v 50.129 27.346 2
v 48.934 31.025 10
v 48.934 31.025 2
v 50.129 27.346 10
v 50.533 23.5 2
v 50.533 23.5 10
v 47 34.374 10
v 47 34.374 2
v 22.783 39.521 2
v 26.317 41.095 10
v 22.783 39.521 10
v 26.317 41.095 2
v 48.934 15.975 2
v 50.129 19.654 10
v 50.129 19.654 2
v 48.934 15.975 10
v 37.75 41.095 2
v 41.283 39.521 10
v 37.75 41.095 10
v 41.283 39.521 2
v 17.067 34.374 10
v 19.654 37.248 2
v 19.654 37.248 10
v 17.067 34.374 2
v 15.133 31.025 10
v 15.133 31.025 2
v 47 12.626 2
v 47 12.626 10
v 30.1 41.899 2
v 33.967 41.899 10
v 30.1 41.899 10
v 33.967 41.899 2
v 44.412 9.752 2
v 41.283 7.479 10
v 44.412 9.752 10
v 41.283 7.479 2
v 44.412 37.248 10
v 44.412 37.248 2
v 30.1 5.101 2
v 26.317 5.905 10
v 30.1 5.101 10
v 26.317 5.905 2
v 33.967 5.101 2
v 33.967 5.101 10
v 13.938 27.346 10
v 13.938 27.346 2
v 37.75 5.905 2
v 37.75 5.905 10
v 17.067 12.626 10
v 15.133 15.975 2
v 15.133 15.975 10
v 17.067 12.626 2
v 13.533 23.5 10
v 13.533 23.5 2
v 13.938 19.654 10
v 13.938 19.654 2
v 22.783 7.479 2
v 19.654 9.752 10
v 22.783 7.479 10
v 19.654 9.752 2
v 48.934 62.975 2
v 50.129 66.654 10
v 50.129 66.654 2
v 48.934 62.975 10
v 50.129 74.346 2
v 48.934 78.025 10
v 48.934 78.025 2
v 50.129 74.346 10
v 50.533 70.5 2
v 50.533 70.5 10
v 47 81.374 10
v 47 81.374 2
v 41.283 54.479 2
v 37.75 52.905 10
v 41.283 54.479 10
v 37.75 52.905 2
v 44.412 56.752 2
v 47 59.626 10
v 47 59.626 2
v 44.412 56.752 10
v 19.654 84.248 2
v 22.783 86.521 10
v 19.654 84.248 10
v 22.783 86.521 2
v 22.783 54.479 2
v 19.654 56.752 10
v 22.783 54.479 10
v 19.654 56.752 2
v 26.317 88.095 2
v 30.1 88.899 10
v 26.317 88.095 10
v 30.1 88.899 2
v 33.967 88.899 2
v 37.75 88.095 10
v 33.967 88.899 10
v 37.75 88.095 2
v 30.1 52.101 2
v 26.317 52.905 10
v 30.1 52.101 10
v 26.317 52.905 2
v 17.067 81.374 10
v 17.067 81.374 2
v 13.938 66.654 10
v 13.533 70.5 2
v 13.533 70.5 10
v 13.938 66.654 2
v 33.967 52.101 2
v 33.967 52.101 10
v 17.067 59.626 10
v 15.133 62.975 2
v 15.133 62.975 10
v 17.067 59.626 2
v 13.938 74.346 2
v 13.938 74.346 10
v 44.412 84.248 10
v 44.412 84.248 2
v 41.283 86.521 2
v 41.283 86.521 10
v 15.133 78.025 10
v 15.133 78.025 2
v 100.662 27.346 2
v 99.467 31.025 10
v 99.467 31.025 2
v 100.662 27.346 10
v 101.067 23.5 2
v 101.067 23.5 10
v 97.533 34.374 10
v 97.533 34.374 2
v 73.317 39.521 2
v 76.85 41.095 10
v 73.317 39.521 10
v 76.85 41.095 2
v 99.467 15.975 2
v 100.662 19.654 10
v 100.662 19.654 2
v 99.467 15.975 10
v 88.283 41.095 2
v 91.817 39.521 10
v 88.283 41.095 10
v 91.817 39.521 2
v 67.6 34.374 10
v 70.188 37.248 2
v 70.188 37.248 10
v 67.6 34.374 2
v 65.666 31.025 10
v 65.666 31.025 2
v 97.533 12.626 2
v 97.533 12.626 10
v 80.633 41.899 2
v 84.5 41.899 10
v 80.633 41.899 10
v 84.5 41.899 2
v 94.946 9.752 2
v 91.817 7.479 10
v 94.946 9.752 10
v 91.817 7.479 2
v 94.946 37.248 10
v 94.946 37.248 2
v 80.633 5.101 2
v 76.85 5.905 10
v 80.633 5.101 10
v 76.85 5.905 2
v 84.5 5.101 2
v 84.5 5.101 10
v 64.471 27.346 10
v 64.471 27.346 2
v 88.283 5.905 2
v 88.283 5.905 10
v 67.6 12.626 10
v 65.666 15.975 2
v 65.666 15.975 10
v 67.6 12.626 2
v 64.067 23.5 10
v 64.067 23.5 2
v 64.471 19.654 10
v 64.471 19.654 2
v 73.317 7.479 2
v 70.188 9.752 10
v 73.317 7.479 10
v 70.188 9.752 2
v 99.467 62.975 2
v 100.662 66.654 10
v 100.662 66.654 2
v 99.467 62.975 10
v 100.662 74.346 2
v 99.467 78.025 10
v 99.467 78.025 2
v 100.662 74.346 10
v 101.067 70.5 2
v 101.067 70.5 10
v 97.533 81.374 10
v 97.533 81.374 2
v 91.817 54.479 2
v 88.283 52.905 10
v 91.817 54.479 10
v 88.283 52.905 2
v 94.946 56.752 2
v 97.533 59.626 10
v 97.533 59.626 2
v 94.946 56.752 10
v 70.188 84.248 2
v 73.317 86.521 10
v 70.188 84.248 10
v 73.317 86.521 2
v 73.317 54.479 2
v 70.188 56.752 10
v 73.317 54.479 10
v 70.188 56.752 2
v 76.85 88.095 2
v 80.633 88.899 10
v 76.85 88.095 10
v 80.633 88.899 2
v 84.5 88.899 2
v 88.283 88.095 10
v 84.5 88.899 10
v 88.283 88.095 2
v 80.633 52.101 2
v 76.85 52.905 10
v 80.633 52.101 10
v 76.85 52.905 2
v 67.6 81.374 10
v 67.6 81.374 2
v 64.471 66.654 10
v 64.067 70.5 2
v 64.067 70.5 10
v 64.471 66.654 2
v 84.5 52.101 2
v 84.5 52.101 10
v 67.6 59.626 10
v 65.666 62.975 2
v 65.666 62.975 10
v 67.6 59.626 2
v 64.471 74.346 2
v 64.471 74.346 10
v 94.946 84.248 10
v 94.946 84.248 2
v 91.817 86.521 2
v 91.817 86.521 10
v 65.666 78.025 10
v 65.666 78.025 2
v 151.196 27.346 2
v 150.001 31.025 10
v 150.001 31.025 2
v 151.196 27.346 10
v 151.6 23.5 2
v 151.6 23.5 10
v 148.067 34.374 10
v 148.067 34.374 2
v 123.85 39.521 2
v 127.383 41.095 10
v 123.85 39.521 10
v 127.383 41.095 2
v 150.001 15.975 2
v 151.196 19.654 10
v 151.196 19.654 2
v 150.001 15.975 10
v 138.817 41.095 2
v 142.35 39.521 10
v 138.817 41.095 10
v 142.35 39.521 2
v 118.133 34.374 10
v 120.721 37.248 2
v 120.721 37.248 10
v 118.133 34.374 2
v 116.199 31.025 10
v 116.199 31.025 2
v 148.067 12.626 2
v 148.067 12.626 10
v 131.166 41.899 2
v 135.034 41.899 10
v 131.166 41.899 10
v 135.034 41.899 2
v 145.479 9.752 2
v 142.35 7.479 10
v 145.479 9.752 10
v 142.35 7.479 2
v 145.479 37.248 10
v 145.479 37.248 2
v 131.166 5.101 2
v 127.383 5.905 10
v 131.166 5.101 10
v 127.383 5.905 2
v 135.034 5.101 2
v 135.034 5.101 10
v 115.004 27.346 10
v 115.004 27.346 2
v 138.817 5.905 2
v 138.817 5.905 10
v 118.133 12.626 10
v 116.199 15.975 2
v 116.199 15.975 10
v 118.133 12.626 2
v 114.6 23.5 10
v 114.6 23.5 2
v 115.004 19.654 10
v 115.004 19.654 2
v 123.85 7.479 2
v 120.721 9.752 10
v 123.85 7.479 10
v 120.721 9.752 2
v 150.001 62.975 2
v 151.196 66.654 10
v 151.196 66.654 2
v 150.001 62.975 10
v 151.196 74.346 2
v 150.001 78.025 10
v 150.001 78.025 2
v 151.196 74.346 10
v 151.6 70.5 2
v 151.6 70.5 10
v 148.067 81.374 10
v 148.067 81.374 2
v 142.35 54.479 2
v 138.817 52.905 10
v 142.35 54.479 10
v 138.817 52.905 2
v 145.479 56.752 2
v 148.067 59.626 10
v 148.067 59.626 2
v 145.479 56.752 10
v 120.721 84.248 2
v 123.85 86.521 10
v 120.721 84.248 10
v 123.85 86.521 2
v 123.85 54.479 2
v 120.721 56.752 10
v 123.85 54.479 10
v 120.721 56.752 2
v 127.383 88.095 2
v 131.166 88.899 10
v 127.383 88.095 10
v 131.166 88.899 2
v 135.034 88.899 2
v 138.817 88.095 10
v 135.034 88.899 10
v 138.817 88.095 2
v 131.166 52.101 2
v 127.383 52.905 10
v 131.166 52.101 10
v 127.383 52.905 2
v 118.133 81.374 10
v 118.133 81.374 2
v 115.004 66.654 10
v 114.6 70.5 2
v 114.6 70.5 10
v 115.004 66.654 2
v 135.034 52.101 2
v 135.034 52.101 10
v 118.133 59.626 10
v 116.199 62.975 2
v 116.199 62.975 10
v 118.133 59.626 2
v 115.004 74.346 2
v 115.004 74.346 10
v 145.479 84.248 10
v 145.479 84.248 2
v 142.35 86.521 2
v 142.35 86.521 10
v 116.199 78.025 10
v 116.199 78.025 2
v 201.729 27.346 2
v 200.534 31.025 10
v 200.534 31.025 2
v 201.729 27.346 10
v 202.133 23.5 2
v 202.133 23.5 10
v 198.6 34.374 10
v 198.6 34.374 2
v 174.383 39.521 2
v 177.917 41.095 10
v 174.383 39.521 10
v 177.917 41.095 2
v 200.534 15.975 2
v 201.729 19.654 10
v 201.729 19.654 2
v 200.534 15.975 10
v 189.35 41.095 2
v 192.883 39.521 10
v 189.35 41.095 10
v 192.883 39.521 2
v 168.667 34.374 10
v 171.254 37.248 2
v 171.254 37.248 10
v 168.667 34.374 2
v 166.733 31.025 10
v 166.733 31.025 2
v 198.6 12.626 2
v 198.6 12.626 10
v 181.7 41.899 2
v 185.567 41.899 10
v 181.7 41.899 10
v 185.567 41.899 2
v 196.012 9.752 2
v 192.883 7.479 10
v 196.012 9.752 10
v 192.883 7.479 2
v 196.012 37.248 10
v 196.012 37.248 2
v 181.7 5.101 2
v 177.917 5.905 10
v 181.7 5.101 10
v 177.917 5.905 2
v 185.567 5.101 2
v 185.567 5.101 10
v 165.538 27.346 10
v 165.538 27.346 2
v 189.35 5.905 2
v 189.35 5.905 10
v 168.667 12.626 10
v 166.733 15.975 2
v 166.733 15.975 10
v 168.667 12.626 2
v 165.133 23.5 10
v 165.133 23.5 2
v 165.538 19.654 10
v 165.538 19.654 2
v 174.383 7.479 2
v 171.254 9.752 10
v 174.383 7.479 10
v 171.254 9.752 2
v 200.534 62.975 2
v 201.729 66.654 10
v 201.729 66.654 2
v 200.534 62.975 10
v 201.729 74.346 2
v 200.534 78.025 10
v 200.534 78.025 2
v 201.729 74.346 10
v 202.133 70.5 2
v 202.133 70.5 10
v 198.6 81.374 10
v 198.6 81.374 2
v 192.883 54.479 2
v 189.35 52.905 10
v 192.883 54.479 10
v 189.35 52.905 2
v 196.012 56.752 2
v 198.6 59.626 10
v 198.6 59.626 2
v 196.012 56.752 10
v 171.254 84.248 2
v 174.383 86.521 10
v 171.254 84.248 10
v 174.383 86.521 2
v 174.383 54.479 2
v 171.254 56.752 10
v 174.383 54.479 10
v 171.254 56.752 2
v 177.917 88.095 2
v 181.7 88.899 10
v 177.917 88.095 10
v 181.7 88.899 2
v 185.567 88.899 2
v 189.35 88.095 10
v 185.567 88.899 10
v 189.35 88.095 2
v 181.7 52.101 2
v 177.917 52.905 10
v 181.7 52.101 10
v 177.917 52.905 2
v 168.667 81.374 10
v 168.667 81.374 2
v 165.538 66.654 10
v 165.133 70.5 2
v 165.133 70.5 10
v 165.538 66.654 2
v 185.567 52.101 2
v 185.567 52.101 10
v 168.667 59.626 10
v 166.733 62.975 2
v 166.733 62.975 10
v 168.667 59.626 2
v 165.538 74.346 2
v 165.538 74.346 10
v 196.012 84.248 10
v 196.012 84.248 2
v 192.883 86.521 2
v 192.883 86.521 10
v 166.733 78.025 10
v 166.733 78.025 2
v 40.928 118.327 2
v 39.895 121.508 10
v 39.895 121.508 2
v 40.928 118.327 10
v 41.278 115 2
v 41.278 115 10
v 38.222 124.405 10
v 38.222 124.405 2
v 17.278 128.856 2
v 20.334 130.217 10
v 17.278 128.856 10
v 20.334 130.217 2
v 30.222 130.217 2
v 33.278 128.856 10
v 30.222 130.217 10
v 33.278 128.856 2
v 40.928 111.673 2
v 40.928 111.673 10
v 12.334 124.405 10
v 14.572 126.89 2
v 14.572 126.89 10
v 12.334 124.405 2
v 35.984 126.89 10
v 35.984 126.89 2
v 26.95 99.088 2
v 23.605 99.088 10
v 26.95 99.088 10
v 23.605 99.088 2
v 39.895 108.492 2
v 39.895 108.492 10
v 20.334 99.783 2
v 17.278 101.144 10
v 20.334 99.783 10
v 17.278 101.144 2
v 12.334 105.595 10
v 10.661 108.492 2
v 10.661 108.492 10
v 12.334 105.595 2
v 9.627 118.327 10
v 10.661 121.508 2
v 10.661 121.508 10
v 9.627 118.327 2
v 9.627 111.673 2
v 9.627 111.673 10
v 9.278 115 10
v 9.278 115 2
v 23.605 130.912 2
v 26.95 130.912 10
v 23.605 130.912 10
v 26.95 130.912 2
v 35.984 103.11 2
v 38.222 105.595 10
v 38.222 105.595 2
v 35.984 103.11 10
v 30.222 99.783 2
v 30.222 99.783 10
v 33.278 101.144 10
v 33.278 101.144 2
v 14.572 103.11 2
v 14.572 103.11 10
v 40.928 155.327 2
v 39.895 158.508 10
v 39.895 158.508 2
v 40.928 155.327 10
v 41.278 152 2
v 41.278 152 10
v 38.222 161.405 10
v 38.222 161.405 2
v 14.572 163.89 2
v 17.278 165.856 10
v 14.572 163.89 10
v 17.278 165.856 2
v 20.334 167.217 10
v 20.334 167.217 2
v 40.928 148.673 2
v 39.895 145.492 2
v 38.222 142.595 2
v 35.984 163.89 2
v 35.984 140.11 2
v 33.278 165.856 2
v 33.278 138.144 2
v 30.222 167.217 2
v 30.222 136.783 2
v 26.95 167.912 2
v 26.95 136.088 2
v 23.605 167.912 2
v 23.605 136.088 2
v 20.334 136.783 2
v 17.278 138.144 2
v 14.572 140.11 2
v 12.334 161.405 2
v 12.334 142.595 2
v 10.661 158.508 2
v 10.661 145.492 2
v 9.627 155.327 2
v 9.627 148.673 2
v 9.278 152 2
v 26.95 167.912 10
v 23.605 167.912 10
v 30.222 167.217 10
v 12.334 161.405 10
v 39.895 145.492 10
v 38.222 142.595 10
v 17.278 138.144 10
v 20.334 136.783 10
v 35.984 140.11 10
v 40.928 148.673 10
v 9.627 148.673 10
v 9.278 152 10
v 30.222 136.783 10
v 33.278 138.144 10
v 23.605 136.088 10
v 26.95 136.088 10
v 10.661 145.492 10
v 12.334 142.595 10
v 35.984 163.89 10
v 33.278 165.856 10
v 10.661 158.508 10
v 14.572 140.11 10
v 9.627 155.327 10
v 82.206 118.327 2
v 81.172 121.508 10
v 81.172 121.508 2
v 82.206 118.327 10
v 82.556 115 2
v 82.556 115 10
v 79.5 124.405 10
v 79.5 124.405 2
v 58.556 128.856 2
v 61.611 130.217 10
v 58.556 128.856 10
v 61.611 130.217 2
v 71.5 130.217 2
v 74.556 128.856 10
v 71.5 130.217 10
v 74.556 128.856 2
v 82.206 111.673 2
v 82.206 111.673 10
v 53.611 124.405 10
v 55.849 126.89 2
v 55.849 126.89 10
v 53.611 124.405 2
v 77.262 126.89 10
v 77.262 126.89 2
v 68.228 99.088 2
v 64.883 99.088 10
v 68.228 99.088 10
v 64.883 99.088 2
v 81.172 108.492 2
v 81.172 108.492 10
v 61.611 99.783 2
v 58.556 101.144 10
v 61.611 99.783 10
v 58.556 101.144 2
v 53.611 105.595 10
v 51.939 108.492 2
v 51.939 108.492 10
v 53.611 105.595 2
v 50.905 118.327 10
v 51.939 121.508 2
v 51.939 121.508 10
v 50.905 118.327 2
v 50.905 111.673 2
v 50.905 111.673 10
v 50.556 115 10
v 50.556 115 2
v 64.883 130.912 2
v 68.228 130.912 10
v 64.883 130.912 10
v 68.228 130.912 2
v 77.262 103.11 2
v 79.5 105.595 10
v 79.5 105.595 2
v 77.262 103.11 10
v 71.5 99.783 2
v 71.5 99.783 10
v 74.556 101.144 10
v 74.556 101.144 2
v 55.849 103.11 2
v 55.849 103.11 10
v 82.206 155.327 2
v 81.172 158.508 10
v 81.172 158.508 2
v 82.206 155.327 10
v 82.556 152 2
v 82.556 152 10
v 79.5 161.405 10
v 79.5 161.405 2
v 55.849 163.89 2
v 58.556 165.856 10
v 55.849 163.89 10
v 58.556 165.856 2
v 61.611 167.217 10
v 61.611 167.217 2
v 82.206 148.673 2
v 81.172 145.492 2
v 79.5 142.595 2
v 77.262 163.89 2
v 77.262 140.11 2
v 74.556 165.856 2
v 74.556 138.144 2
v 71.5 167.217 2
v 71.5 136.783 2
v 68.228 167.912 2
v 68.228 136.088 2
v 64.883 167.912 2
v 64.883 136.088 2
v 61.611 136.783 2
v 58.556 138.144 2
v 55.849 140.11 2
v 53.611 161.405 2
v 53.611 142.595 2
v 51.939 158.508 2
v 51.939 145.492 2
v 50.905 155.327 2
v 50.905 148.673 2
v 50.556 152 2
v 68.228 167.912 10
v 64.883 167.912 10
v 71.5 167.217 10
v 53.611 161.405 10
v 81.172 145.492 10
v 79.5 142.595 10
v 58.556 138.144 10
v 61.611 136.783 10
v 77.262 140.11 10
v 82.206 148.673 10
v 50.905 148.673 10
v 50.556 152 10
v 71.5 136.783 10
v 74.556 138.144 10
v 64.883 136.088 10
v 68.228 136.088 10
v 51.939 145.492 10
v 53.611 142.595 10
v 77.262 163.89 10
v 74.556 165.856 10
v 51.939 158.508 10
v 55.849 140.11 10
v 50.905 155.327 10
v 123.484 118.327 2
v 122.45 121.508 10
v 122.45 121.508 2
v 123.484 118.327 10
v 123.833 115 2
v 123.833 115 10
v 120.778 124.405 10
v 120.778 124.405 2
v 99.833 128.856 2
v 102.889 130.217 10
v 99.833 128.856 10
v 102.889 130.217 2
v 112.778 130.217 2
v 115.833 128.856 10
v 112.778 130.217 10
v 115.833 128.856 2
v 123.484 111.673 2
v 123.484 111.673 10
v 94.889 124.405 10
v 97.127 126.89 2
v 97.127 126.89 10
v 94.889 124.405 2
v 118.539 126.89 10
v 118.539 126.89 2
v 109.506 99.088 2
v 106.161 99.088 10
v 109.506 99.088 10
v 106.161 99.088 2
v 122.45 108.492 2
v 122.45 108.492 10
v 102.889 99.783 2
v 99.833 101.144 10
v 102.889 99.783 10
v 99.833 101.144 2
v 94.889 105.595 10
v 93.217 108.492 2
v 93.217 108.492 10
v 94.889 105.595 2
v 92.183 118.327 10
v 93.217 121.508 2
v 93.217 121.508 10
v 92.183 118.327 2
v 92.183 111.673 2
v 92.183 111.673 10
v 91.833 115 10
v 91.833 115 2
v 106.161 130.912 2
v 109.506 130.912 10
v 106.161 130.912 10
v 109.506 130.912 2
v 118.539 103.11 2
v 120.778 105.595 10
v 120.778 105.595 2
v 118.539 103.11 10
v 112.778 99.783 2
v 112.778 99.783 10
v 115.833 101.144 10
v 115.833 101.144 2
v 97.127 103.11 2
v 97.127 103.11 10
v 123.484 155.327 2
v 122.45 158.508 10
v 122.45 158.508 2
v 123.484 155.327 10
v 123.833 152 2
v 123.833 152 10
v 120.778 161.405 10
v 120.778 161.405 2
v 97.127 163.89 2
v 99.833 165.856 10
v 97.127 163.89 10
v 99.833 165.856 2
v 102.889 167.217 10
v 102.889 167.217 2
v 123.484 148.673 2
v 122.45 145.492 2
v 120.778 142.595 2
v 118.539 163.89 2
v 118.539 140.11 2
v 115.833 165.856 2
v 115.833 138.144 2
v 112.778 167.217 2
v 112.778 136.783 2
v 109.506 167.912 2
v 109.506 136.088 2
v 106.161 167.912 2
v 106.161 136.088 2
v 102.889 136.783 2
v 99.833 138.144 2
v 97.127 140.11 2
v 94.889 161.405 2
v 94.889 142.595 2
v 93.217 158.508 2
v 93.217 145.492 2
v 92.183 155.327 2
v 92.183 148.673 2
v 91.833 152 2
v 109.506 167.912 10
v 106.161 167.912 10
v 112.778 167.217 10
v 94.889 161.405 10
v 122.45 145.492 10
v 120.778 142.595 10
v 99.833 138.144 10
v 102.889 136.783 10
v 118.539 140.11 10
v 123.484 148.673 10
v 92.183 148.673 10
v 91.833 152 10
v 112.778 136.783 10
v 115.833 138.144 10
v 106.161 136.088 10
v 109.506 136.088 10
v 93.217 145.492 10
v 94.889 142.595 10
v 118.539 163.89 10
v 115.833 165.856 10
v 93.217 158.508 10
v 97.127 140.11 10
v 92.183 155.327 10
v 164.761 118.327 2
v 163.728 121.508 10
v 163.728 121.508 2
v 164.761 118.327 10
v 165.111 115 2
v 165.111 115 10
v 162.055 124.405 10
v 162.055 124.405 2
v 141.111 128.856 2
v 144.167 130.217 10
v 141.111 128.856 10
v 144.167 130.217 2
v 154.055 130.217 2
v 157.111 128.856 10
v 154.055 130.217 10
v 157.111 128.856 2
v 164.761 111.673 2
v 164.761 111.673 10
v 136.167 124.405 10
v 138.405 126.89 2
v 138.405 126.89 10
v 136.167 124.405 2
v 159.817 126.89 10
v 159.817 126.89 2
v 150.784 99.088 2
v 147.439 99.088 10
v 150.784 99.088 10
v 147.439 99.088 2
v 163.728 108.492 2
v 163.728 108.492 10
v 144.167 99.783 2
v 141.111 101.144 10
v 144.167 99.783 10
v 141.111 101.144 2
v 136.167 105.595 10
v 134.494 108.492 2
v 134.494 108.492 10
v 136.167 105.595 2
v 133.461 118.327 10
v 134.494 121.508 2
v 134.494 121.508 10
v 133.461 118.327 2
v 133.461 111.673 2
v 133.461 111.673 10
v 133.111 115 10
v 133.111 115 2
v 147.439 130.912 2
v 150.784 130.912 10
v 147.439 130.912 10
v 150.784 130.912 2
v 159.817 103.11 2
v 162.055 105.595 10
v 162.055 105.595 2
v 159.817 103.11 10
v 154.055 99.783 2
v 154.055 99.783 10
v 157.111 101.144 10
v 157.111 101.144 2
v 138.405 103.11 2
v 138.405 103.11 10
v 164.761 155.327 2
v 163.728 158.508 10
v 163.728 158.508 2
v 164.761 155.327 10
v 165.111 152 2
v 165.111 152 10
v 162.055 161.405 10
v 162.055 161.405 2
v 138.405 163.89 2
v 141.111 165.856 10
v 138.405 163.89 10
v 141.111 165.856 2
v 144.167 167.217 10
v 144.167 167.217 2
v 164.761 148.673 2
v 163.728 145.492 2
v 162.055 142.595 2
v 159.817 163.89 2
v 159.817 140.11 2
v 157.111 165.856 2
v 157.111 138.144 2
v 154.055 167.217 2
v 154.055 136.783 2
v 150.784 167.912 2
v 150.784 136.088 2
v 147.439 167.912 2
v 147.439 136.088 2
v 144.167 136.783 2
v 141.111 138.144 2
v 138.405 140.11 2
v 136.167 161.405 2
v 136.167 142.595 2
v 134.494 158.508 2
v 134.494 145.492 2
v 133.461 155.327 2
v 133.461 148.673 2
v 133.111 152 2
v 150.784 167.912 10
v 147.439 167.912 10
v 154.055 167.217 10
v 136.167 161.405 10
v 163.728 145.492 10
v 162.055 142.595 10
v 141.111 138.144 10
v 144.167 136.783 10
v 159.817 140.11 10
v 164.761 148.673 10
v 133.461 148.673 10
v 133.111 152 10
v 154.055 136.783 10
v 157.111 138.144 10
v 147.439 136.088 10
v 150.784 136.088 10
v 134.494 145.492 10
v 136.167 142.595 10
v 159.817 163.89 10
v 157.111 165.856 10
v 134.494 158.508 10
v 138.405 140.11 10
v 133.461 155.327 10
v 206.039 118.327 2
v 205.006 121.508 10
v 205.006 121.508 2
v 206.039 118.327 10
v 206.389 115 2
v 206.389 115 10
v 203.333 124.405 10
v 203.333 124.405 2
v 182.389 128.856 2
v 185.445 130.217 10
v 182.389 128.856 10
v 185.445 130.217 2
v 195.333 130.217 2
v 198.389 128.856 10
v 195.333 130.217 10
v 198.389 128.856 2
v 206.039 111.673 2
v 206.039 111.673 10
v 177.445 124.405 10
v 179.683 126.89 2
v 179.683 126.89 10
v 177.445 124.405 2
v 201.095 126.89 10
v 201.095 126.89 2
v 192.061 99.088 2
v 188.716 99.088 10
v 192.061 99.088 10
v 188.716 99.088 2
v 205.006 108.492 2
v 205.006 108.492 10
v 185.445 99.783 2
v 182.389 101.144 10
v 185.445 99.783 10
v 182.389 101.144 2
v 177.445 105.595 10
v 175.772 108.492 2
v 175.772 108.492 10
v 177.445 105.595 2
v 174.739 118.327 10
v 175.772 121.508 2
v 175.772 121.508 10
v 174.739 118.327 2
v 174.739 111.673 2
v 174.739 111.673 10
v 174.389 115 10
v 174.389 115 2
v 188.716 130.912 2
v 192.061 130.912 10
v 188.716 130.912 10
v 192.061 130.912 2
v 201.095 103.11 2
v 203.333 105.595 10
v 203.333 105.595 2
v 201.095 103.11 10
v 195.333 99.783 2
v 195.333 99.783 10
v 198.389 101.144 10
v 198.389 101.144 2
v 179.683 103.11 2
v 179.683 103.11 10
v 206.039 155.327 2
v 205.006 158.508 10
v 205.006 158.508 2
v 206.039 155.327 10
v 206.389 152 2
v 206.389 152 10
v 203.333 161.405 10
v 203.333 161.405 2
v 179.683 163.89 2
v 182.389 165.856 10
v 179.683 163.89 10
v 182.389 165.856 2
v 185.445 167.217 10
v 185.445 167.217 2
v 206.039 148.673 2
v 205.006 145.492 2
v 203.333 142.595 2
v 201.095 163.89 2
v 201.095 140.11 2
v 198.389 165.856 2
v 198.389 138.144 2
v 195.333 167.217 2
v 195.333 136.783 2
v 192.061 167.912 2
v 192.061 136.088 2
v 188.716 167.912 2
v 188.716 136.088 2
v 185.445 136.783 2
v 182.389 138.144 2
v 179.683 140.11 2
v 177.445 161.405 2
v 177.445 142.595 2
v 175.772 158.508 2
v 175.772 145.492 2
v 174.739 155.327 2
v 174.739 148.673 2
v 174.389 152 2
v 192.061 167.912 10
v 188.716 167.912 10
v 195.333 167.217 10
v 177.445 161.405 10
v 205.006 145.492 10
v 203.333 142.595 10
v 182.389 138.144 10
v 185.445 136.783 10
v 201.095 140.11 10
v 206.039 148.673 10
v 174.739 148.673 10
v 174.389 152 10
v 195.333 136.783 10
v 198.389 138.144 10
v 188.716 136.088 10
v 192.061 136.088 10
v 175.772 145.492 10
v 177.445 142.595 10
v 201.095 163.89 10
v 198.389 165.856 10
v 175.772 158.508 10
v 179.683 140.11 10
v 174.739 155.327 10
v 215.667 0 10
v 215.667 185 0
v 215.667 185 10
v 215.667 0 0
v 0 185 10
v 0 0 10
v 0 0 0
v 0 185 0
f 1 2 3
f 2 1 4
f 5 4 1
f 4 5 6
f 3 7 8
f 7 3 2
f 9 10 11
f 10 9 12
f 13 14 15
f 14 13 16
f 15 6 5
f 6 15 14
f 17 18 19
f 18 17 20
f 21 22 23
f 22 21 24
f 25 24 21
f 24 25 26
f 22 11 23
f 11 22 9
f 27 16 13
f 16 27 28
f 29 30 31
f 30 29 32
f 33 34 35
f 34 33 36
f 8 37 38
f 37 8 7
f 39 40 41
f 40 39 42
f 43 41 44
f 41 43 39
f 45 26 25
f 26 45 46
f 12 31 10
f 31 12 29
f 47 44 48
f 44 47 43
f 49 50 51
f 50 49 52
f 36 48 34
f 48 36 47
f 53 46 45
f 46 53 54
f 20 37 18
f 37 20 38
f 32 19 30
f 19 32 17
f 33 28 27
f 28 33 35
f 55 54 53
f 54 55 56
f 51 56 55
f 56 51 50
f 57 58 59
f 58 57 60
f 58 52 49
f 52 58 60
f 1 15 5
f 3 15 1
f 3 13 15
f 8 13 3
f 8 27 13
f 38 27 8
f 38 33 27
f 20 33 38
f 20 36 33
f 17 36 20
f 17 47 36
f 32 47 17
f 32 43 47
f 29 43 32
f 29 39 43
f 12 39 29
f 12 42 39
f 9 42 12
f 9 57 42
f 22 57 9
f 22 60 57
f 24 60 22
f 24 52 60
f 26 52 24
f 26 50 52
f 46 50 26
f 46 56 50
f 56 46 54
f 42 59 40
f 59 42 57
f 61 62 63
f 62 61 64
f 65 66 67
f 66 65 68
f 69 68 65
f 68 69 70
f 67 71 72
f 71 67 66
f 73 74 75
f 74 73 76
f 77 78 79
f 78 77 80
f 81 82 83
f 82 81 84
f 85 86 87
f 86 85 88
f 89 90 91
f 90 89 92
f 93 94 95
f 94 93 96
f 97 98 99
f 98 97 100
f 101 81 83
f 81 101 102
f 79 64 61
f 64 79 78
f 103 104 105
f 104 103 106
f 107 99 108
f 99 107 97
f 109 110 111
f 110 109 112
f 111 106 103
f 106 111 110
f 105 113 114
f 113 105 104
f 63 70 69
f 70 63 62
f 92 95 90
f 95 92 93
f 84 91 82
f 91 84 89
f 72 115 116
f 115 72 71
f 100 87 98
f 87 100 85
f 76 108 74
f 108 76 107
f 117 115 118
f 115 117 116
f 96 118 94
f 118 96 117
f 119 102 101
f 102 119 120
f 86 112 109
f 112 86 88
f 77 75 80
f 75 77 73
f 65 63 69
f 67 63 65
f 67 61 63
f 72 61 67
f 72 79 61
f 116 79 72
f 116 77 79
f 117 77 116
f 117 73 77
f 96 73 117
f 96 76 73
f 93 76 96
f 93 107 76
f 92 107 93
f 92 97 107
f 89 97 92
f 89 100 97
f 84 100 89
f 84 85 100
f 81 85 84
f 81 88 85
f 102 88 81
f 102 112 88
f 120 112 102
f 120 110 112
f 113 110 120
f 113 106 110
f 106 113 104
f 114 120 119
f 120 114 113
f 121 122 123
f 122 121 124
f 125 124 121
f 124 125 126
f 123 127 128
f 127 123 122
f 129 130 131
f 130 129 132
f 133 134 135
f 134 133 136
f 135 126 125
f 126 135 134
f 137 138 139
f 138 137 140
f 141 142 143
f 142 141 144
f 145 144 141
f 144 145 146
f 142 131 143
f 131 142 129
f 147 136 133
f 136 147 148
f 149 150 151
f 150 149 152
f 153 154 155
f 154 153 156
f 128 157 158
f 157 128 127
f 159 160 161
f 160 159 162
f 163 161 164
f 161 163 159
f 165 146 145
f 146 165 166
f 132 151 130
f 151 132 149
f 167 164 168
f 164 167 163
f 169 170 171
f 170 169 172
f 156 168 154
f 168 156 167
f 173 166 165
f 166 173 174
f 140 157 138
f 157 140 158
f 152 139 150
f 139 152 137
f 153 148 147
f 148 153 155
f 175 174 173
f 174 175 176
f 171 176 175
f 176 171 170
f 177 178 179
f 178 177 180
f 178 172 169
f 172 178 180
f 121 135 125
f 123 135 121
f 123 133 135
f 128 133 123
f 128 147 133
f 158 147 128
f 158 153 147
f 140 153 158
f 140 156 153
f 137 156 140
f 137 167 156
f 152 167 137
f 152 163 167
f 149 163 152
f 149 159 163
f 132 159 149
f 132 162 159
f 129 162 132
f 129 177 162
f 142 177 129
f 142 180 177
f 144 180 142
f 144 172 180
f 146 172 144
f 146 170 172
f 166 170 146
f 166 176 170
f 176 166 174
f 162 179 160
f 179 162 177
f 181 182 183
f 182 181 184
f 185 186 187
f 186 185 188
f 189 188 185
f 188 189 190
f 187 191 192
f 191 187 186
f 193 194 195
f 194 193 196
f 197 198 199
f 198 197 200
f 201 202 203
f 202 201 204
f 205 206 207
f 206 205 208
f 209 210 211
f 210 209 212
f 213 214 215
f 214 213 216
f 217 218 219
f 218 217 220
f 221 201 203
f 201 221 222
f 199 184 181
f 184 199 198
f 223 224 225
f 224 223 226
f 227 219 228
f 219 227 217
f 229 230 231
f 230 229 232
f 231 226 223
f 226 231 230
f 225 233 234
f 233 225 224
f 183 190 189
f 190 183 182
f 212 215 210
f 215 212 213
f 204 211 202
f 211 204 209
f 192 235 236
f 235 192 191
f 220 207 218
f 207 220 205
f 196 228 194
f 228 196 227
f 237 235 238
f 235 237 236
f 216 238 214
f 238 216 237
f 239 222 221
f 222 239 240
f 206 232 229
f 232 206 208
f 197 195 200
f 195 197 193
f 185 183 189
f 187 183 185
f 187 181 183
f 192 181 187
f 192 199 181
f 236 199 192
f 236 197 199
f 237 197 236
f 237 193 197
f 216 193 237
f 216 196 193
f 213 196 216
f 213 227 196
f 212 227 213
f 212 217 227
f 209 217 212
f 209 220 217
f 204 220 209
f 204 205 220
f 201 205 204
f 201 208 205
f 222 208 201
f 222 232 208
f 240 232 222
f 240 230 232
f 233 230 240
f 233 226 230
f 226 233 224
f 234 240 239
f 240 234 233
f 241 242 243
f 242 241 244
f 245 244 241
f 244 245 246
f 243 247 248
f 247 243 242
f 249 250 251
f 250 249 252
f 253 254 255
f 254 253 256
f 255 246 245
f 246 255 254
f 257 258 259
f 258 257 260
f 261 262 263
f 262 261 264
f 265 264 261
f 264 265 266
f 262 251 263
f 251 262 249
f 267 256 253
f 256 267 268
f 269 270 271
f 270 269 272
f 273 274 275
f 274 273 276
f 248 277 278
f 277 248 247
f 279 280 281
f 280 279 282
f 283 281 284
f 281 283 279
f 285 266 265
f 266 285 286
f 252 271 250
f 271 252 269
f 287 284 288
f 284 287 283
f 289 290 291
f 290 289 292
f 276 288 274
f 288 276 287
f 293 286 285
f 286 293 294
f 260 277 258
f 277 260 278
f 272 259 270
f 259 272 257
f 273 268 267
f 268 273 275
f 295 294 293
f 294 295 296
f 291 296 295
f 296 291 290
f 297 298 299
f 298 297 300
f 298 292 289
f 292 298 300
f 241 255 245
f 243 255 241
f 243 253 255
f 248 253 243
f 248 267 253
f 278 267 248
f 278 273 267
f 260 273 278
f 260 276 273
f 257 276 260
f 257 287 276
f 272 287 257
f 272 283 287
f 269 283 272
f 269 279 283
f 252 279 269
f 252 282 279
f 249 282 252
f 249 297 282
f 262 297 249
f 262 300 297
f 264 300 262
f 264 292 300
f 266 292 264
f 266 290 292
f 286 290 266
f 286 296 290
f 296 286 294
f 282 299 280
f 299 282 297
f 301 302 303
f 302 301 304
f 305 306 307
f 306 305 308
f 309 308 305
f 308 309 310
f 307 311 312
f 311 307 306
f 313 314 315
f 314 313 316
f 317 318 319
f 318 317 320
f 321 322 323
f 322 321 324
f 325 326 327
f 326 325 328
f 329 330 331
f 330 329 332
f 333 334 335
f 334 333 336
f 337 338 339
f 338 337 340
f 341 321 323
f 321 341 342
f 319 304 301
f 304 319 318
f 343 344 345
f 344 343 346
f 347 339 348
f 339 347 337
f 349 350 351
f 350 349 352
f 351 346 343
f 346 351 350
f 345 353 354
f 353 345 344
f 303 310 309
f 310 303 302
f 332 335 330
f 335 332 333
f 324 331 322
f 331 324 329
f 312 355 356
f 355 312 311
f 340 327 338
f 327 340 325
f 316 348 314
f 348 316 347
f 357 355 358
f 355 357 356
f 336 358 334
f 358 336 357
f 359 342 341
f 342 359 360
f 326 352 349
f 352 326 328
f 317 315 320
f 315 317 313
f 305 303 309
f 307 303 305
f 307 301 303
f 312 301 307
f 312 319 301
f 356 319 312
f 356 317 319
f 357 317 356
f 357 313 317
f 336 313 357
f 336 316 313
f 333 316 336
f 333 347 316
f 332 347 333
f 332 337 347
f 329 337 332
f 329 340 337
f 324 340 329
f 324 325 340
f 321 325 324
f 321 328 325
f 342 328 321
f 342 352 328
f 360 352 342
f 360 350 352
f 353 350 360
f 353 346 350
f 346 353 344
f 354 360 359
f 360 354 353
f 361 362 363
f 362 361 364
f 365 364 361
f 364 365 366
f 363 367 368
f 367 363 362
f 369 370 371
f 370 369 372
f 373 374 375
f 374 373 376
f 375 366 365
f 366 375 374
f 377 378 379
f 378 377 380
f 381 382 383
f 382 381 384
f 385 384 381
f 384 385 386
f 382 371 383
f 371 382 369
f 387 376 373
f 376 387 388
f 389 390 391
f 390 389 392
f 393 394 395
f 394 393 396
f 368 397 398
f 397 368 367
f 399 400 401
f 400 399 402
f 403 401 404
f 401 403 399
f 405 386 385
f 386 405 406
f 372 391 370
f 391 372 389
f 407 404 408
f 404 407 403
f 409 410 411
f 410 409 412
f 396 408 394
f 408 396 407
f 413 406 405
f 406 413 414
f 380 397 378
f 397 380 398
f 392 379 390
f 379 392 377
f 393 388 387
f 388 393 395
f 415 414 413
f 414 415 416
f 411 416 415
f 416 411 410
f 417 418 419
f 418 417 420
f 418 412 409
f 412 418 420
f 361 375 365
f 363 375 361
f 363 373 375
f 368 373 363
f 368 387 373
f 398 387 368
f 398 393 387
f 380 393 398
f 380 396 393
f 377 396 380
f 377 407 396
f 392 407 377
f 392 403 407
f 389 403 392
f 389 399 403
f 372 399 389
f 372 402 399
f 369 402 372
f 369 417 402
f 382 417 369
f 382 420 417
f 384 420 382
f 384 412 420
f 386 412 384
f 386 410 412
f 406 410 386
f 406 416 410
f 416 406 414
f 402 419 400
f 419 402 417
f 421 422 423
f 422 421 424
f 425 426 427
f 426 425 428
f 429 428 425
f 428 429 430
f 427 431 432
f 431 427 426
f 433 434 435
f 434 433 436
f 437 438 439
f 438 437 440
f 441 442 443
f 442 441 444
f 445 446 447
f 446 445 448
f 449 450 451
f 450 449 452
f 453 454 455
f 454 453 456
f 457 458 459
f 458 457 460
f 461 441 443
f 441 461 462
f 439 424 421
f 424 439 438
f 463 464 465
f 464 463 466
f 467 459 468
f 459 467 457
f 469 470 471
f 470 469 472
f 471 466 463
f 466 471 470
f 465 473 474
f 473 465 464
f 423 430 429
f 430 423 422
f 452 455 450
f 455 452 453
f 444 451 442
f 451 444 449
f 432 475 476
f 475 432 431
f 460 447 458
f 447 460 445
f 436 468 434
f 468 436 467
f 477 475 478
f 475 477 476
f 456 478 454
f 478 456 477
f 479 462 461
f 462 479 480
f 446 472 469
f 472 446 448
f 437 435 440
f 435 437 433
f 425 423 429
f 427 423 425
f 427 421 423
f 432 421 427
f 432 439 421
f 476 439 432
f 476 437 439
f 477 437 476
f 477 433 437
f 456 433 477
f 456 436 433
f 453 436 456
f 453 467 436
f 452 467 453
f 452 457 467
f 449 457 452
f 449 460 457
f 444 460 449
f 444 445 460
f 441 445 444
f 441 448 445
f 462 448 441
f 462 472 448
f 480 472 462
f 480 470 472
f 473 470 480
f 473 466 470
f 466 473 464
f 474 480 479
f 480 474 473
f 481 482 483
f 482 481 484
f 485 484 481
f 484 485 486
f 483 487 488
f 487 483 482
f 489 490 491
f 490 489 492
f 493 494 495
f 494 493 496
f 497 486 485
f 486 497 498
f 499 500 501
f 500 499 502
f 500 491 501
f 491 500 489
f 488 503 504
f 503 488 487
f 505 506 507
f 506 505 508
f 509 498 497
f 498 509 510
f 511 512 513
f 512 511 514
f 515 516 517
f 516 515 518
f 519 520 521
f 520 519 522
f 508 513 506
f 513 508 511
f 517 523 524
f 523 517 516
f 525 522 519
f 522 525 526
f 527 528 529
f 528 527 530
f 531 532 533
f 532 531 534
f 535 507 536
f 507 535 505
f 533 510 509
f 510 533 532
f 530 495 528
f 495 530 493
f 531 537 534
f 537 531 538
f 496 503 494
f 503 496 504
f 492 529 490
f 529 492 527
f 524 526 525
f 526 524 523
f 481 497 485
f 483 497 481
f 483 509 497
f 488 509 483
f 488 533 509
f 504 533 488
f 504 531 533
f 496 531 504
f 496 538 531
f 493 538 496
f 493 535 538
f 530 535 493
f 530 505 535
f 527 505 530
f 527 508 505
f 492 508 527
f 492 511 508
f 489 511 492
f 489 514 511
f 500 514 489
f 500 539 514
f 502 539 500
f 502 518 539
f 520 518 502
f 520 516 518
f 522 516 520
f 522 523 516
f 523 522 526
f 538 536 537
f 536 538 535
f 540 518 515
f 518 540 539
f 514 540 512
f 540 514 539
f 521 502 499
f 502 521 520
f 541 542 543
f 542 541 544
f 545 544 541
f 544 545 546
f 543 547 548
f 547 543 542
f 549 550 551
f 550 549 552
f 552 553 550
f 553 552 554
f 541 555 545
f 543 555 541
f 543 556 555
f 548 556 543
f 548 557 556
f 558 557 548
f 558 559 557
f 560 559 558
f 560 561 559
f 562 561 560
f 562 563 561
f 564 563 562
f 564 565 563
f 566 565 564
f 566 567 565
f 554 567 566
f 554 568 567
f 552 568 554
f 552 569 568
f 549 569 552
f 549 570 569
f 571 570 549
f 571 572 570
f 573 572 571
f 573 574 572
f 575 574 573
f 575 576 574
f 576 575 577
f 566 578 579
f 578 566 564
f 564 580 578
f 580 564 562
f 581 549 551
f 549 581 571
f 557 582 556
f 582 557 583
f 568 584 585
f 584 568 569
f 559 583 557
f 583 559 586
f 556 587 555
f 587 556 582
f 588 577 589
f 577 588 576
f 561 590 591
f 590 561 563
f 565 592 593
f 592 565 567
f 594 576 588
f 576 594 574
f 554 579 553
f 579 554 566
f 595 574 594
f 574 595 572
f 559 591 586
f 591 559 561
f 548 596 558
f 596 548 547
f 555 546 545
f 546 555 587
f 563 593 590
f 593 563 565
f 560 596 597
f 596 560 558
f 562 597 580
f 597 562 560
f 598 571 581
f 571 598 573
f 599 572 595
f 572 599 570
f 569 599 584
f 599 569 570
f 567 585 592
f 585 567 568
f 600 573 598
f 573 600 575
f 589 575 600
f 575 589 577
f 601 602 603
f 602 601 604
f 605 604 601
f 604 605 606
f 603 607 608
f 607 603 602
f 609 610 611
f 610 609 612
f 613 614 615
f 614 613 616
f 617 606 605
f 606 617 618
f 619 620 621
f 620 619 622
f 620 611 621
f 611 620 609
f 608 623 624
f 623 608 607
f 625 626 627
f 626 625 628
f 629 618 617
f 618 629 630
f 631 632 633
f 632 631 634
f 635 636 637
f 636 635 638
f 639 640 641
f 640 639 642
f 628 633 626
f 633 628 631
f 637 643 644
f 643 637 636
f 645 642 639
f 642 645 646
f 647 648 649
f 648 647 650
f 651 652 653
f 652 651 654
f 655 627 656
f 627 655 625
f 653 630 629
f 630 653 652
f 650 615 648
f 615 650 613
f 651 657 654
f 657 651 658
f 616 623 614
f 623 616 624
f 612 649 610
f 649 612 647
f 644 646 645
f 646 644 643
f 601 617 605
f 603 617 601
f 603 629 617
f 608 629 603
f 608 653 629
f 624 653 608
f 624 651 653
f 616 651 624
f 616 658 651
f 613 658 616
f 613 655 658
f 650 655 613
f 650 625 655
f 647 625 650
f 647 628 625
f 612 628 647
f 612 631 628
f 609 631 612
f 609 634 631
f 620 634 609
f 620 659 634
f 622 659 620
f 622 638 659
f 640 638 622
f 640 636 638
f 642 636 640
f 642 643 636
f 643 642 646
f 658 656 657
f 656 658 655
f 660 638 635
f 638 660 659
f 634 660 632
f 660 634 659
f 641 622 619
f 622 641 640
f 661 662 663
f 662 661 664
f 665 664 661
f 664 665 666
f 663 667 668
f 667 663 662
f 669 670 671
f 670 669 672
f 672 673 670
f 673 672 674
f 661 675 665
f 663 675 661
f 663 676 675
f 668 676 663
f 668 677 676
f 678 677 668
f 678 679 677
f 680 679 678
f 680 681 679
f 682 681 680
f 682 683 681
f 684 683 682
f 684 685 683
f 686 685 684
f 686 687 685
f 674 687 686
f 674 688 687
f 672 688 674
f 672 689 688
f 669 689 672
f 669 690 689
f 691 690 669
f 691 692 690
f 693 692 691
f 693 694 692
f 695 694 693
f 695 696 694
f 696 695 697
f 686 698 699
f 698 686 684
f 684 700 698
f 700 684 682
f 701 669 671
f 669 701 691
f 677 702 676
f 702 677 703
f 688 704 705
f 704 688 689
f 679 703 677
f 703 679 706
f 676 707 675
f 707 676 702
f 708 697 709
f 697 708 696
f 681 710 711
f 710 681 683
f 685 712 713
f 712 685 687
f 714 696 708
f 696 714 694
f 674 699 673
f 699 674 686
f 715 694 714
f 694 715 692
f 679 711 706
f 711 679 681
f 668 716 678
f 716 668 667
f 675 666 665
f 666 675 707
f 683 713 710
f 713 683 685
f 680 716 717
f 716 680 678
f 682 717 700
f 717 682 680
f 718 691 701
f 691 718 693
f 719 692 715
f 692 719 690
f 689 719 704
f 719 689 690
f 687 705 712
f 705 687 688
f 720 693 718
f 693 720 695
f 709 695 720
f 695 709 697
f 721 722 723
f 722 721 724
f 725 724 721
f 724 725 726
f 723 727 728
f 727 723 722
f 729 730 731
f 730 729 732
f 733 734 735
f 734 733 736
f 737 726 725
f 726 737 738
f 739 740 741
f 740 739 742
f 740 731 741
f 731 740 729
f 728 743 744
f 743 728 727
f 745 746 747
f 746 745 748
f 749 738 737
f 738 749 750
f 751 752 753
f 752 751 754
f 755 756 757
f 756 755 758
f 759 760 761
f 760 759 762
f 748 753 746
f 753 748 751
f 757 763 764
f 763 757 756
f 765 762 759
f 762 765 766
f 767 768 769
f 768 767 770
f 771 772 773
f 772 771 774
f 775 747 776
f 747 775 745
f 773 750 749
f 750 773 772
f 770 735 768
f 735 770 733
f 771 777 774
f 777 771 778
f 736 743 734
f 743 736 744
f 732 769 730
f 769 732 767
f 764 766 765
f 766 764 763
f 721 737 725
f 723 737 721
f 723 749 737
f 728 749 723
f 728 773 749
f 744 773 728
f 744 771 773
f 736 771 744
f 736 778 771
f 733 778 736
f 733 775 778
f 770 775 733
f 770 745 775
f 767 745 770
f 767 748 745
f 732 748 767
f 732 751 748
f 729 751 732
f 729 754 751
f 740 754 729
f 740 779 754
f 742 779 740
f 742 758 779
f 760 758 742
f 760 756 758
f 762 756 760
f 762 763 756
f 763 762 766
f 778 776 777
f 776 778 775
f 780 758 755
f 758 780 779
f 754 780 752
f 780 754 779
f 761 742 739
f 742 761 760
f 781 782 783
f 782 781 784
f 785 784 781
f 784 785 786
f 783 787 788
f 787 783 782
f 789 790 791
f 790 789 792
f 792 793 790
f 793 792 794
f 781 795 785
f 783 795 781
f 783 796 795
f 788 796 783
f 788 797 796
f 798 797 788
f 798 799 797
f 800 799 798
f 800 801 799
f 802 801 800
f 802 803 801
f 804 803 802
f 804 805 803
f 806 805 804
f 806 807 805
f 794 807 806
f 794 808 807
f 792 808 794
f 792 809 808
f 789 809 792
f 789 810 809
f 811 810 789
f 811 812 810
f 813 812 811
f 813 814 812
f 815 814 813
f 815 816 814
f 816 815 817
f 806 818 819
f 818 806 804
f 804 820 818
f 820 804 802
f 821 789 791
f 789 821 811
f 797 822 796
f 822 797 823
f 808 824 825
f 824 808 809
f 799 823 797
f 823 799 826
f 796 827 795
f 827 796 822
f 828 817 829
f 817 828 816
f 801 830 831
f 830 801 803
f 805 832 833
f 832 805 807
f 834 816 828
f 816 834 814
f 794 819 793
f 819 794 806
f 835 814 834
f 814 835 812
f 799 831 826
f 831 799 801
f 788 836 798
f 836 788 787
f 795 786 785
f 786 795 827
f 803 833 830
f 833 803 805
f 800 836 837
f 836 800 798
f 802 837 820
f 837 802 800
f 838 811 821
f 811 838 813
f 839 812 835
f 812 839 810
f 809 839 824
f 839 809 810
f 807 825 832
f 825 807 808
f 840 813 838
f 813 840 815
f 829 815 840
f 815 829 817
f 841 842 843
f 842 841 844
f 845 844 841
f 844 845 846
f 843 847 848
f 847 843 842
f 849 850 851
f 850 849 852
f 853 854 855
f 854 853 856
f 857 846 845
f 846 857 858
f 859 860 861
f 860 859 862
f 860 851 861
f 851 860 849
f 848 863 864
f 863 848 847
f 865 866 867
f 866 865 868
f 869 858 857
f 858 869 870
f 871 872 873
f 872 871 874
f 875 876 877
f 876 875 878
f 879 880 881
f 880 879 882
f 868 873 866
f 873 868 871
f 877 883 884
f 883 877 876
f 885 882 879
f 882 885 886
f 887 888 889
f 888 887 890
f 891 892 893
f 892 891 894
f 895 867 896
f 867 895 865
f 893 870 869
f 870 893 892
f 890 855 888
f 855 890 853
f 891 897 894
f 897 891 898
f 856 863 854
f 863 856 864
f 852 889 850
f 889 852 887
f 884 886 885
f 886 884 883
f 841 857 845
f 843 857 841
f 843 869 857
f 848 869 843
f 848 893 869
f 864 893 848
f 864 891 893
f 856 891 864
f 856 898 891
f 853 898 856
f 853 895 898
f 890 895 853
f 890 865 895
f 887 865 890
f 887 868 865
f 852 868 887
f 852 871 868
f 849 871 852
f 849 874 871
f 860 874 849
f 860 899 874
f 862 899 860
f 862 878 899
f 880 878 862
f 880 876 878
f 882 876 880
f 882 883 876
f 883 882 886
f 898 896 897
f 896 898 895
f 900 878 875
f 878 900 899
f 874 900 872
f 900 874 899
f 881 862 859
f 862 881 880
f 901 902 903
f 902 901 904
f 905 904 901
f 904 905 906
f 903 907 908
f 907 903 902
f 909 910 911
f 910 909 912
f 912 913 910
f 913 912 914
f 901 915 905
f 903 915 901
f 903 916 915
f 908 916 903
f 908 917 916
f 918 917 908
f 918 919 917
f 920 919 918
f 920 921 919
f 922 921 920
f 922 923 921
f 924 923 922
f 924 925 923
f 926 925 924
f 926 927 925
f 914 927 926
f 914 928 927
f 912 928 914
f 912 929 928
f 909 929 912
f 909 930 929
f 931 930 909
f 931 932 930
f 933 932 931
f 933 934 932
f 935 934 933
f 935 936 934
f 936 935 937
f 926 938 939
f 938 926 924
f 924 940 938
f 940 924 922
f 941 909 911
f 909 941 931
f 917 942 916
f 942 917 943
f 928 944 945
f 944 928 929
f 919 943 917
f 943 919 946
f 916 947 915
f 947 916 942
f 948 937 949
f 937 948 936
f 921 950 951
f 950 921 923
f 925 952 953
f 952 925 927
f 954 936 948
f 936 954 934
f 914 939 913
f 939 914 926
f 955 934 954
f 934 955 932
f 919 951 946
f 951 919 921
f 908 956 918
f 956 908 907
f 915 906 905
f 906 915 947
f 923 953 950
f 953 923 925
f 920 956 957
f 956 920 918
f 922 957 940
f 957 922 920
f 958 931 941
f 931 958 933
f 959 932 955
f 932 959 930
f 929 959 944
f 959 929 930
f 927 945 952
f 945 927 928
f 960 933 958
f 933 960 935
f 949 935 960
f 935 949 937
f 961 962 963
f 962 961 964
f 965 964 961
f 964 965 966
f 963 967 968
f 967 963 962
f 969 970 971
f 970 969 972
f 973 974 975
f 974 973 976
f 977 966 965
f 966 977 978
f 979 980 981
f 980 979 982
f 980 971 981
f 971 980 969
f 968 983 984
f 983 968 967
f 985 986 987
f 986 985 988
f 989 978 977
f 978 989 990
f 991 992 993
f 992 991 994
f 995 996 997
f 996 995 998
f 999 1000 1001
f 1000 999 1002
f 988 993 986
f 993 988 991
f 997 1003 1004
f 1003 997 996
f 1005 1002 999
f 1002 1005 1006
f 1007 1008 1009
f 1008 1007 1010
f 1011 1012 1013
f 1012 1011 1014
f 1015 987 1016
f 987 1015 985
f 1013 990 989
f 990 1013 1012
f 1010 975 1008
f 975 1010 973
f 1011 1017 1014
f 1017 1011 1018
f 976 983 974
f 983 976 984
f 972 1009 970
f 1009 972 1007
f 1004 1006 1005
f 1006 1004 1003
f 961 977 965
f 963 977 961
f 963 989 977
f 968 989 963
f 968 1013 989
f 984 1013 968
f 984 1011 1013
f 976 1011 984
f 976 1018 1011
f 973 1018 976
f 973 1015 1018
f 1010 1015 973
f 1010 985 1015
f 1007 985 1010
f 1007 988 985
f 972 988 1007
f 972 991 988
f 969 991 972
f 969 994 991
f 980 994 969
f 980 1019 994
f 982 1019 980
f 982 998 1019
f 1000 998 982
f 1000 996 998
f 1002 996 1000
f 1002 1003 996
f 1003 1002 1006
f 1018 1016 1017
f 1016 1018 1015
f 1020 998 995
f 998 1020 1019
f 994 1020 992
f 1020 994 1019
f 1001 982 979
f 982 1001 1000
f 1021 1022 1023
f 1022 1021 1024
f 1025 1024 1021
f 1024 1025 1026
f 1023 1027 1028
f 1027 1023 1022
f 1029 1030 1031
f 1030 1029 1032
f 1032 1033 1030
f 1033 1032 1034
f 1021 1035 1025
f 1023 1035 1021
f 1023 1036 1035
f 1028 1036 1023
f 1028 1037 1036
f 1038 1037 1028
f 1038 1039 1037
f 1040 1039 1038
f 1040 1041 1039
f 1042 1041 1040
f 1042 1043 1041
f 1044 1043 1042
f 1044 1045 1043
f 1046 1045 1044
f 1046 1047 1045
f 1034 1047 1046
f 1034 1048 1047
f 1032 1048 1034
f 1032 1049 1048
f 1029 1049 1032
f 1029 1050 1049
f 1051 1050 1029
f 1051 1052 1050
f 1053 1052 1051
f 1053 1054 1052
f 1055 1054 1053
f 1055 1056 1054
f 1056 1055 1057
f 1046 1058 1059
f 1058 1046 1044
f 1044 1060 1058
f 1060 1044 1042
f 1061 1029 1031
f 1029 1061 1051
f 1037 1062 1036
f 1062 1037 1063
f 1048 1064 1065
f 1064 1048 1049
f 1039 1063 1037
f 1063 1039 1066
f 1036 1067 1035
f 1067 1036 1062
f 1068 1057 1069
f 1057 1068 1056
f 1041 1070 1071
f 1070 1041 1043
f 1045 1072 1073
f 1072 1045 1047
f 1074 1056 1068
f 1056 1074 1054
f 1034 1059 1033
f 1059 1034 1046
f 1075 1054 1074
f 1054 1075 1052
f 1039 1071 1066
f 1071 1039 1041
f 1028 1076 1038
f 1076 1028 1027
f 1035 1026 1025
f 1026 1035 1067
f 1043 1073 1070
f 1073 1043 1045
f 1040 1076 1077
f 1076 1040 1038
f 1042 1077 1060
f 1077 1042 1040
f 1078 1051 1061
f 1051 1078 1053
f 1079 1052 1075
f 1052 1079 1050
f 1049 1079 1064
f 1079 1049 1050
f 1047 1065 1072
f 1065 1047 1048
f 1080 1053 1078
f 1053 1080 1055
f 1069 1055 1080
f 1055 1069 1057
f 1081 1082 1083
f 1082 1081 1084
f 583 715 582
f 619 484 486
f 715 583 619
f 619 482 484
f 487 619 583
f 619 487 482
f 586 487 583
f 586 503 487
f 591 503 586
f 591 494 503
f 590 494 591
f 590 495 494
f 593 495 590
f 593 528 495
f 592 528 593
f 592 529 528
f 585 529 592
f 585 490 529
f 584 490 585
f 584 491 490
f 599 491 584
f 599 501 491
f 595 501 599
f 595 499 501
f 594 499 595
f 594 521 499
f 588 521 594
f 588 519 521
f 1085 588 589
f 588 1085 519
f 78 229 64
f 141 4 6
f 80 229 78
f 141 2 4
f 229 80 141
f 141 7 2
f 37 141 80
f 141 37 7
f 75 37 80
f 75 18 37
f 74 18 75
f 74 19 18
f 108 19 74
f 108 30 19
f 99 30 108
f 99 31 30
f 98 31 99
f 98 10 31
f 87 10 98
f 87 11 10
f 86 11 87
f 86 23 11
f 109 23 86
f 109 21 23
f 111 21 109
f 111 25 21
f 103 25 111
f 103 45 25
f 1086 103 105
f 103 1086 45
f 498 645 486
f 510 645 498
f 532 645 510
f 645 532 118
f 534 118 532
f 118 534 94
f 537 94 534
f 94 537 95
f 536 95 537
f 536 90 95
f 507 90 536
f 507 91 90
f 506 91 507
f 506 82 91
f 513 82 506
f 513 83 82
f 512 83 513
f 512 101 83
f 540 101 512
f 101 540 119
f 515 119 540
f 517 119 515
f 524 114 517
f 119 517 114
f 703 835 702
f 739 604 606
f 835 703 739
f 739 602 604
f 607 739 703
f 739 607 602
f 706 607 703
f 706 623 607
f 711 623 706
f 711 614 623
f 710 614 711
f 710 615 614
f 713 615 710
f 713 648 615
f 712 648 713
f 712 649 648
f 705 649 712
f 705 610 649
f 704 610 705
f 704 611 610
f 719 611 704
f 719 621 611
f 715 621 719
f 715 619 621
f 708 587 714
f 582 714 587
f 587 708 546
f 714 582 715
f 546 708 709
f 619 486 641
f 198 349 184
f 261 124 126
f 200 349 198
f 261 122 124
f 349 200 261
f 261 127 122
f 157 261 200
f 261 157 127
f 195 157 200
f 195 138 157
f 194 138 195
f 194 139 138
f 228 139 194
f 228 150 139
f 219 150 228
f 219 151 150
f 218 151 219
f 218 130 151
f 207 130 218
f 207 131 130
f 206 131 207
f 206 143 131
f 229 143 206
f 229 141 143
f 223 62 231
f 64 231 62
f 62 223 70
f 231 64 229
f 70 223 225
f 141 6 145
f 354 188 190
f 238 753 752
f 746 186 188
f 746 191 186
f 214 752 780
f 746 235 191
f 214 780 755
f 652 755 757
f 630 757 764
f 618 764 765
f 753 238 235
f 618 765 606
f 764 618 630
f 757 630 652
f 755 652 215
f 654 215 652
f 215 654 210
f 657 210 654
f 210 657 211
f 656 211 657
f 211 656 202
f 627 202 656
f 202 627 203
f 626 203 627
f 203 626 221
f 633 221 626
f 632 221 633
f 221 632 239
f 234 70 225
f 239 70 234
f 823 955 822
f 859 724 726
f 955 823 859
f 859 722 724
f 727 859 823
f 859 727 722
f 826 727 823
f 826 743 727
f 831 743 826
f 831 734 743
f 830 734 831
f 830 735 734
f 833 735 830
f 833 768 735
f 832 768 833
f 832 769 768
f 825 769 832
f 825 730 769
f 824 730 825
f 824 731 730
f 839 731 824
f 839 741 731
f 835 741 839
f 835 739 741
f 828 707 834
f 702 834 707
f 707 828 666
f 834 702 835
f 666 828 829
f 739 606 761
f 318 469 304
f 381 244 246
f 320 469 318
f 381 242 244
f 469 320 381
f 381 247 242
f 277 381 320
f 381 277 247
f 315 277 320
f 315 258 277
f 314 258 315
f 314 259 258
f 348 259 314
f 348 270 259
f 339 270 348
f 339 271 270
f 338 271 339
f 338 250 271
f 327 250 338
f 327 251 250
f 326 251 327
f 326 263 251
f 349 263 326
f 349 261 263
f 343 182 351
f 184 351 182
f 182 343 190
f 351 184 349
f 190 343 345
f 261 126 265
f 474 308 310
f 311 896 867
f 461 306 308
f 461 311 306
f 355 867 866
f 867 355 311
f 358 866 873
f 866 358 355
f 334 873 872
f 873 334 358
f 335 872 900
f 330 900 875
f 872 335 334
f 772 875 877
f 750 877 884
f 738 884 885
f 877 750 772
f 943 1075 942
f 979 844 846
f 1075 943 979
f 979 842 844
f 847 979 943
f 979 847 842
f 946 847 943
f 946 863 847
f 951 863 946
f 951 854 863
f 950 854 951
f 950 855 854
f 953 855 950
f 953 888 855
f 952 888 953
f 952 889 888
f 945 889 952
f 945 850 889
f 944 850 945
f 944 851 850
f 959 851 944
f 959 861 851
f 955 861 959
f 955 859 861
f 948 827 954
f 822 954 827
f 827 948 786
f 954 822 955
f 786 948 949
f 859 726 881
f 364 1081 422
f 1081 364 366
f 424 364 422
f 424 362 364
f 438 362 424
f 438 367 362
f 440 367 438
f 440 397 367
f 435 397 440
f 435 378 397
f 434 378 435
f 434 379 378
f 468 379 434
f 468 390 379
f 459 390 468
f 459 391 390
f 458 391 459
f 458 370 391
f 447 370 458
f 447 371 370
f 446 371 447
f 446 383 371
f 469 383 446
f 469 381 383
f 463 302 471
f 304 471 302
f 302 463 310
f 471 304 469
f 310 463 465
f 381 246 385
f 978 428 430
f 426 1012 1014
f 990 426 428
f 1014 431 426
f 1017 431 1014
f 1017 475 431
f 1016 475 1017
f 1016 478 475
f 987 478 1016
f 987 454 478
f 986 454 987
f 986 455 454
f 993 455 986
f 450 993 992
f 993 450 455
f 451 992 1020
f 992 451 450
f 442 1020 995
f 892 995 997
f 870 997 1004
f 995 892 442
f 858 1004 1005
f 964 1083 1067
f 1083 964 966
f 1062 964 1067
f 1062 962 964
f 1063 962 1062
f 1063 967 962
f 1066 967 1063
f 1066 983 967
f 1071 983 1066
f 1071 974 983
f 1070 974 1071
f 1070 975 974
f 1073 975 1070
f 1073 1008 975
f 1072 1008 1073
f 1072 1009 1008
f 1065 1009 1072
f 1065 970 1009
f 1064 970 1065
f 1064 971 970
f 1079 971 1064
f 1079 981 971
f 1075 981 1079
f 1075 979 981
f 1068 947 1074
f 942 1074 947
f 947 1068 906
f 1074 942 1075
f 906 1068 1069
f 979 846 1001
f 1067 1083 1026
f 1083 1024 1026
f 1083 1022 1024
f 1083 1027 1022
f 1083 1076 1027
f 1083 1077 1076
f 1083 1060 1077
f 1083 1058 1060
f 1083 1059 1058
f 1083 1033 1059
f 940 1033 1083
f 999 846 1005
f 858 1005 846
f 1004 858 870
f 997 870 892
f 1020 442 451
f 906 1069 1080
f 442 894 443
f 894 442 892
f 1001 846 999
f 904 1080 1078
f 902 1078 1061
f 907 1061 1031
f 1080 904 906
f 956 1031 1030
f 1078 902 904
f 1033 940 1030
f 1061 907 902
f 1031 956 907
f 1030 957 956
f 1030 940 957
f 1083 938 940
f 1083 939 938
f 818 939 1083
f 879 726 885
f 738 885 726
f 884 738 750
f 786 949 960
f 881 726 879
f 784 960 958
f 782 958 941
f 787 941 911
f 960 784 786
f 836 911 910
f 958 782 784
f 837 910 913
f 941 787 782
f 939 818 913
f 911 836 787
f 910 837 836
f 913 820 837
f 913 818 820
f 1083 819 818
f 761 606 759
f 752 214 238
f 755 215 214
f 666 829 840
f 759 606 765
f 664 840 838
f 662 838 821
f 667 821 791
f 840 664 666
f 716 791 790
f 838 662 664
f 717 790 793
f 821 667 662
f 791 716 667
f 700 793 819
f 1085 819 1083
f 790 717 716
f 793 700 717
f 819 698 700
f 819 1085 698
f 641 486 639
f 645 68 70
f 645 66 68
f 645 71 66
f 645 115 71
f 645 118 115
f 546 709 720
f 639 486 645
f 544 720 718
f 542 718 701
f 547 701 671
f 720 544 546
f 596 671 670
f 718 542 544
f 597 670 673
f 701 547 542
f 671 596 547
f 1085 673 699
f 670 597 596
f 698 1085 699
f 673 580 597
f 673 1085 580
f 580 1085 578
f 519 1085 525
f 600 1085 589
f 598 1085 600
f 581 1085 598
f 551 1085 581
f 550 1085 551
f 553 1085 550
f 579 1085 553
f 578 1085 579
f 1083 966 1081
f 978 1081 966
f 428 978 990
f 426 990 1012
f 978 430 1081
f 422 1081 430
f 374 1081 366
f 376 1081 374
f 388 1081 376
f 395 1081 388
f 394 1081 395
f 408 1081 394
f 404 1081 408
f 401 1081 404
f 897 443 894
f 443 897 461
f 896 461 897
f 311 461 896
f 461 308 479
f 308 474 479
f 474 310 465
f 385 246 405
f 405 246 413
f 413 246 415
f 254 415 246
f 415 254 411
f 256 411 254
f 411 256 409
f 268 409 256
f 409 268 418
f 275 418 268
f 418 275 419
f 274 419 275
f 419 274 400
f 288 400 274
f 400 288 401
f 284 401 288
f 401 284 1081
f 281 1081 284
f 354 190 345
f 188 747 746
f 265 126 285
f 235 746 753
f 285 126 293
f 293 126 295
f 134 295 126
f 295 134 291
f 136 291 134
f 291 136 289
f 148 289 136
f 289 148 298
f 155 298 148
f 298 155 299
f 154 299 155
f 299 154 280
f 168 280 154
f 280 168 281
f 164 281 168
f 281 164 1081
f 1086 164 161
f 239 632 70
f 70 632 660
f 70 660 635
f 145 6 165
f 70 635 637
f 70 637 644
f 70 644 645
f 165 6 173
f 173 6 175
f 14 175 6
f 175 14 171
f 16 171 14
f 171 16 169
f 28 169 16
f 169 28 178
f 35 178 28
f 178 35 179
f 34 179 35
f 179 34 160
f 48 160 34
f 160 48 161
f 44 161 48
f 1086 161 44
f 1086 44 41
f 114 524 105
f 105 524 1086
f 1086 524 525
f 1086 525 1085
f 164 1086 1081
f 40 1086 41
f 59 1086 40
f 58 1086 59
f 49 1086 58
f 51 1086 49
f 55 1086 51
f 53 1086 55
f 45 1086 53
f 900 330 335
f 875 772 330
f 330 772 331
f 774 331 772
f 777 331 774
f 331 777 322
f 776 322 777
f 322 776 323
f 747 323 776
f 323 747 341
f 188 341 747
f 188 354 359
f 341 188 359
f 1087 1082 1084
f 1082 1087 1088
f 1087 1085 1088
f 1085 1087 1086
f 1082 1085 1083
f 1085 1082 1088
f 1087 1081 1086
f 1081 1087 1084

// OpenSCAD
drawer_width = 647;
drawer_height = 370;
base_x = drawer_width/3;
base_y = drawer_height/2;
base_thickness = 10;
base_floor = 2; 
depth = base_thickness - base_floor;
small_bottle_diameter = 32;
medium_bottle_diameter = 37;

bottom_margin = 5;
spacing_y = 5;

medium_bottle_spacing_y = spacing_y + medium_bottle_diameter/2;
medium_spacing = (base_x - 4*medium_bottle_diameter)/5;
medium_bottle_y2 = medium_bottle_diameter + 2*spacing_y;

small_bottle_y = medium_bottle_y2 + spacing_y*3 + medium_bottle_diameter + small_bottle_diameter/2;
small_bottle_spacing_y = (base_x - 5*small_bottle_diameter)/6;
small_bottle_y2 = small_bottle_diameter+spacing_y;

difference() {
  cube([base_x,base_y,base_thickness]);
  medium_bottles();
  small_bottles();
}

function small_bottle_x(bottle_number) =
  small_bottle_spacing_y+
  small_bottle_diameter/2+
  (small_bottle_spacing_y+small_bottle_diameter)*bottle_number;

module small_bottles() {
  translate([small_bottle_x(0),small_bottle_y,0]) { 
    small_bottle_pair();
  }
  translate([small_bottle_x(1),small_bottle_y,0]) {
    small_bottle_pair();
  }
  translate([small_bottle_x(2),small_bottle_y,0]) {
    small_bottle_pair();
  }
  translate([small_bottle_x(3),small_bottle_y,0]) {
    small_bottle_pair();
  }
  translate([small_bottle_x(4),small_bottle_y,0]) {
    small_bottle_pair();
  }
}

module small_bottle_pair() {
  color("orange") {
    translate([0,0,2]) {
    cylinder(h=10, d=small_bottle_diameter);
    }
    translate([0,small_bottle_y2,2]) {
    cylinder(h=10, d=small_bottle_diameter);
    }
  }
}

function medium_bottle_x(bottle_number) = (medium_spacing+medium_bottle_diameter/2)+(medium_spacing+(medium_bottle_diameter))*bottle_number;

module medium_bottles() {
  translate([medium_bottle_x(0),medium_bottle_spacing_y,0]) {
    medium_bottle_pair();
  }
  translate([medium_bottle_x(1),medium_bottle_spacing_y,0]) {
    medium_bottle_pair();
  }
  translate([medium_bottle_x(2),medium_bottle_spacing_y,0]) {
    medium_bottle_pair();
  }
  translate([medium_bottle_x(3),medium_bottle_spacing_y,0]) {
    medium_bottle_pair();
  }
}

module medium_bottle_pair() {
  color("purple") {
    translate([0,0,2]) {
      cylinder(h=10, d=medium_bottle_diameter);
      }
    }
  color("blue") {
    translate([0,medium_bottle_y2,2]) {
      cylinder(h=10, d=medium_bottle_diameter);
    }
  }
}
